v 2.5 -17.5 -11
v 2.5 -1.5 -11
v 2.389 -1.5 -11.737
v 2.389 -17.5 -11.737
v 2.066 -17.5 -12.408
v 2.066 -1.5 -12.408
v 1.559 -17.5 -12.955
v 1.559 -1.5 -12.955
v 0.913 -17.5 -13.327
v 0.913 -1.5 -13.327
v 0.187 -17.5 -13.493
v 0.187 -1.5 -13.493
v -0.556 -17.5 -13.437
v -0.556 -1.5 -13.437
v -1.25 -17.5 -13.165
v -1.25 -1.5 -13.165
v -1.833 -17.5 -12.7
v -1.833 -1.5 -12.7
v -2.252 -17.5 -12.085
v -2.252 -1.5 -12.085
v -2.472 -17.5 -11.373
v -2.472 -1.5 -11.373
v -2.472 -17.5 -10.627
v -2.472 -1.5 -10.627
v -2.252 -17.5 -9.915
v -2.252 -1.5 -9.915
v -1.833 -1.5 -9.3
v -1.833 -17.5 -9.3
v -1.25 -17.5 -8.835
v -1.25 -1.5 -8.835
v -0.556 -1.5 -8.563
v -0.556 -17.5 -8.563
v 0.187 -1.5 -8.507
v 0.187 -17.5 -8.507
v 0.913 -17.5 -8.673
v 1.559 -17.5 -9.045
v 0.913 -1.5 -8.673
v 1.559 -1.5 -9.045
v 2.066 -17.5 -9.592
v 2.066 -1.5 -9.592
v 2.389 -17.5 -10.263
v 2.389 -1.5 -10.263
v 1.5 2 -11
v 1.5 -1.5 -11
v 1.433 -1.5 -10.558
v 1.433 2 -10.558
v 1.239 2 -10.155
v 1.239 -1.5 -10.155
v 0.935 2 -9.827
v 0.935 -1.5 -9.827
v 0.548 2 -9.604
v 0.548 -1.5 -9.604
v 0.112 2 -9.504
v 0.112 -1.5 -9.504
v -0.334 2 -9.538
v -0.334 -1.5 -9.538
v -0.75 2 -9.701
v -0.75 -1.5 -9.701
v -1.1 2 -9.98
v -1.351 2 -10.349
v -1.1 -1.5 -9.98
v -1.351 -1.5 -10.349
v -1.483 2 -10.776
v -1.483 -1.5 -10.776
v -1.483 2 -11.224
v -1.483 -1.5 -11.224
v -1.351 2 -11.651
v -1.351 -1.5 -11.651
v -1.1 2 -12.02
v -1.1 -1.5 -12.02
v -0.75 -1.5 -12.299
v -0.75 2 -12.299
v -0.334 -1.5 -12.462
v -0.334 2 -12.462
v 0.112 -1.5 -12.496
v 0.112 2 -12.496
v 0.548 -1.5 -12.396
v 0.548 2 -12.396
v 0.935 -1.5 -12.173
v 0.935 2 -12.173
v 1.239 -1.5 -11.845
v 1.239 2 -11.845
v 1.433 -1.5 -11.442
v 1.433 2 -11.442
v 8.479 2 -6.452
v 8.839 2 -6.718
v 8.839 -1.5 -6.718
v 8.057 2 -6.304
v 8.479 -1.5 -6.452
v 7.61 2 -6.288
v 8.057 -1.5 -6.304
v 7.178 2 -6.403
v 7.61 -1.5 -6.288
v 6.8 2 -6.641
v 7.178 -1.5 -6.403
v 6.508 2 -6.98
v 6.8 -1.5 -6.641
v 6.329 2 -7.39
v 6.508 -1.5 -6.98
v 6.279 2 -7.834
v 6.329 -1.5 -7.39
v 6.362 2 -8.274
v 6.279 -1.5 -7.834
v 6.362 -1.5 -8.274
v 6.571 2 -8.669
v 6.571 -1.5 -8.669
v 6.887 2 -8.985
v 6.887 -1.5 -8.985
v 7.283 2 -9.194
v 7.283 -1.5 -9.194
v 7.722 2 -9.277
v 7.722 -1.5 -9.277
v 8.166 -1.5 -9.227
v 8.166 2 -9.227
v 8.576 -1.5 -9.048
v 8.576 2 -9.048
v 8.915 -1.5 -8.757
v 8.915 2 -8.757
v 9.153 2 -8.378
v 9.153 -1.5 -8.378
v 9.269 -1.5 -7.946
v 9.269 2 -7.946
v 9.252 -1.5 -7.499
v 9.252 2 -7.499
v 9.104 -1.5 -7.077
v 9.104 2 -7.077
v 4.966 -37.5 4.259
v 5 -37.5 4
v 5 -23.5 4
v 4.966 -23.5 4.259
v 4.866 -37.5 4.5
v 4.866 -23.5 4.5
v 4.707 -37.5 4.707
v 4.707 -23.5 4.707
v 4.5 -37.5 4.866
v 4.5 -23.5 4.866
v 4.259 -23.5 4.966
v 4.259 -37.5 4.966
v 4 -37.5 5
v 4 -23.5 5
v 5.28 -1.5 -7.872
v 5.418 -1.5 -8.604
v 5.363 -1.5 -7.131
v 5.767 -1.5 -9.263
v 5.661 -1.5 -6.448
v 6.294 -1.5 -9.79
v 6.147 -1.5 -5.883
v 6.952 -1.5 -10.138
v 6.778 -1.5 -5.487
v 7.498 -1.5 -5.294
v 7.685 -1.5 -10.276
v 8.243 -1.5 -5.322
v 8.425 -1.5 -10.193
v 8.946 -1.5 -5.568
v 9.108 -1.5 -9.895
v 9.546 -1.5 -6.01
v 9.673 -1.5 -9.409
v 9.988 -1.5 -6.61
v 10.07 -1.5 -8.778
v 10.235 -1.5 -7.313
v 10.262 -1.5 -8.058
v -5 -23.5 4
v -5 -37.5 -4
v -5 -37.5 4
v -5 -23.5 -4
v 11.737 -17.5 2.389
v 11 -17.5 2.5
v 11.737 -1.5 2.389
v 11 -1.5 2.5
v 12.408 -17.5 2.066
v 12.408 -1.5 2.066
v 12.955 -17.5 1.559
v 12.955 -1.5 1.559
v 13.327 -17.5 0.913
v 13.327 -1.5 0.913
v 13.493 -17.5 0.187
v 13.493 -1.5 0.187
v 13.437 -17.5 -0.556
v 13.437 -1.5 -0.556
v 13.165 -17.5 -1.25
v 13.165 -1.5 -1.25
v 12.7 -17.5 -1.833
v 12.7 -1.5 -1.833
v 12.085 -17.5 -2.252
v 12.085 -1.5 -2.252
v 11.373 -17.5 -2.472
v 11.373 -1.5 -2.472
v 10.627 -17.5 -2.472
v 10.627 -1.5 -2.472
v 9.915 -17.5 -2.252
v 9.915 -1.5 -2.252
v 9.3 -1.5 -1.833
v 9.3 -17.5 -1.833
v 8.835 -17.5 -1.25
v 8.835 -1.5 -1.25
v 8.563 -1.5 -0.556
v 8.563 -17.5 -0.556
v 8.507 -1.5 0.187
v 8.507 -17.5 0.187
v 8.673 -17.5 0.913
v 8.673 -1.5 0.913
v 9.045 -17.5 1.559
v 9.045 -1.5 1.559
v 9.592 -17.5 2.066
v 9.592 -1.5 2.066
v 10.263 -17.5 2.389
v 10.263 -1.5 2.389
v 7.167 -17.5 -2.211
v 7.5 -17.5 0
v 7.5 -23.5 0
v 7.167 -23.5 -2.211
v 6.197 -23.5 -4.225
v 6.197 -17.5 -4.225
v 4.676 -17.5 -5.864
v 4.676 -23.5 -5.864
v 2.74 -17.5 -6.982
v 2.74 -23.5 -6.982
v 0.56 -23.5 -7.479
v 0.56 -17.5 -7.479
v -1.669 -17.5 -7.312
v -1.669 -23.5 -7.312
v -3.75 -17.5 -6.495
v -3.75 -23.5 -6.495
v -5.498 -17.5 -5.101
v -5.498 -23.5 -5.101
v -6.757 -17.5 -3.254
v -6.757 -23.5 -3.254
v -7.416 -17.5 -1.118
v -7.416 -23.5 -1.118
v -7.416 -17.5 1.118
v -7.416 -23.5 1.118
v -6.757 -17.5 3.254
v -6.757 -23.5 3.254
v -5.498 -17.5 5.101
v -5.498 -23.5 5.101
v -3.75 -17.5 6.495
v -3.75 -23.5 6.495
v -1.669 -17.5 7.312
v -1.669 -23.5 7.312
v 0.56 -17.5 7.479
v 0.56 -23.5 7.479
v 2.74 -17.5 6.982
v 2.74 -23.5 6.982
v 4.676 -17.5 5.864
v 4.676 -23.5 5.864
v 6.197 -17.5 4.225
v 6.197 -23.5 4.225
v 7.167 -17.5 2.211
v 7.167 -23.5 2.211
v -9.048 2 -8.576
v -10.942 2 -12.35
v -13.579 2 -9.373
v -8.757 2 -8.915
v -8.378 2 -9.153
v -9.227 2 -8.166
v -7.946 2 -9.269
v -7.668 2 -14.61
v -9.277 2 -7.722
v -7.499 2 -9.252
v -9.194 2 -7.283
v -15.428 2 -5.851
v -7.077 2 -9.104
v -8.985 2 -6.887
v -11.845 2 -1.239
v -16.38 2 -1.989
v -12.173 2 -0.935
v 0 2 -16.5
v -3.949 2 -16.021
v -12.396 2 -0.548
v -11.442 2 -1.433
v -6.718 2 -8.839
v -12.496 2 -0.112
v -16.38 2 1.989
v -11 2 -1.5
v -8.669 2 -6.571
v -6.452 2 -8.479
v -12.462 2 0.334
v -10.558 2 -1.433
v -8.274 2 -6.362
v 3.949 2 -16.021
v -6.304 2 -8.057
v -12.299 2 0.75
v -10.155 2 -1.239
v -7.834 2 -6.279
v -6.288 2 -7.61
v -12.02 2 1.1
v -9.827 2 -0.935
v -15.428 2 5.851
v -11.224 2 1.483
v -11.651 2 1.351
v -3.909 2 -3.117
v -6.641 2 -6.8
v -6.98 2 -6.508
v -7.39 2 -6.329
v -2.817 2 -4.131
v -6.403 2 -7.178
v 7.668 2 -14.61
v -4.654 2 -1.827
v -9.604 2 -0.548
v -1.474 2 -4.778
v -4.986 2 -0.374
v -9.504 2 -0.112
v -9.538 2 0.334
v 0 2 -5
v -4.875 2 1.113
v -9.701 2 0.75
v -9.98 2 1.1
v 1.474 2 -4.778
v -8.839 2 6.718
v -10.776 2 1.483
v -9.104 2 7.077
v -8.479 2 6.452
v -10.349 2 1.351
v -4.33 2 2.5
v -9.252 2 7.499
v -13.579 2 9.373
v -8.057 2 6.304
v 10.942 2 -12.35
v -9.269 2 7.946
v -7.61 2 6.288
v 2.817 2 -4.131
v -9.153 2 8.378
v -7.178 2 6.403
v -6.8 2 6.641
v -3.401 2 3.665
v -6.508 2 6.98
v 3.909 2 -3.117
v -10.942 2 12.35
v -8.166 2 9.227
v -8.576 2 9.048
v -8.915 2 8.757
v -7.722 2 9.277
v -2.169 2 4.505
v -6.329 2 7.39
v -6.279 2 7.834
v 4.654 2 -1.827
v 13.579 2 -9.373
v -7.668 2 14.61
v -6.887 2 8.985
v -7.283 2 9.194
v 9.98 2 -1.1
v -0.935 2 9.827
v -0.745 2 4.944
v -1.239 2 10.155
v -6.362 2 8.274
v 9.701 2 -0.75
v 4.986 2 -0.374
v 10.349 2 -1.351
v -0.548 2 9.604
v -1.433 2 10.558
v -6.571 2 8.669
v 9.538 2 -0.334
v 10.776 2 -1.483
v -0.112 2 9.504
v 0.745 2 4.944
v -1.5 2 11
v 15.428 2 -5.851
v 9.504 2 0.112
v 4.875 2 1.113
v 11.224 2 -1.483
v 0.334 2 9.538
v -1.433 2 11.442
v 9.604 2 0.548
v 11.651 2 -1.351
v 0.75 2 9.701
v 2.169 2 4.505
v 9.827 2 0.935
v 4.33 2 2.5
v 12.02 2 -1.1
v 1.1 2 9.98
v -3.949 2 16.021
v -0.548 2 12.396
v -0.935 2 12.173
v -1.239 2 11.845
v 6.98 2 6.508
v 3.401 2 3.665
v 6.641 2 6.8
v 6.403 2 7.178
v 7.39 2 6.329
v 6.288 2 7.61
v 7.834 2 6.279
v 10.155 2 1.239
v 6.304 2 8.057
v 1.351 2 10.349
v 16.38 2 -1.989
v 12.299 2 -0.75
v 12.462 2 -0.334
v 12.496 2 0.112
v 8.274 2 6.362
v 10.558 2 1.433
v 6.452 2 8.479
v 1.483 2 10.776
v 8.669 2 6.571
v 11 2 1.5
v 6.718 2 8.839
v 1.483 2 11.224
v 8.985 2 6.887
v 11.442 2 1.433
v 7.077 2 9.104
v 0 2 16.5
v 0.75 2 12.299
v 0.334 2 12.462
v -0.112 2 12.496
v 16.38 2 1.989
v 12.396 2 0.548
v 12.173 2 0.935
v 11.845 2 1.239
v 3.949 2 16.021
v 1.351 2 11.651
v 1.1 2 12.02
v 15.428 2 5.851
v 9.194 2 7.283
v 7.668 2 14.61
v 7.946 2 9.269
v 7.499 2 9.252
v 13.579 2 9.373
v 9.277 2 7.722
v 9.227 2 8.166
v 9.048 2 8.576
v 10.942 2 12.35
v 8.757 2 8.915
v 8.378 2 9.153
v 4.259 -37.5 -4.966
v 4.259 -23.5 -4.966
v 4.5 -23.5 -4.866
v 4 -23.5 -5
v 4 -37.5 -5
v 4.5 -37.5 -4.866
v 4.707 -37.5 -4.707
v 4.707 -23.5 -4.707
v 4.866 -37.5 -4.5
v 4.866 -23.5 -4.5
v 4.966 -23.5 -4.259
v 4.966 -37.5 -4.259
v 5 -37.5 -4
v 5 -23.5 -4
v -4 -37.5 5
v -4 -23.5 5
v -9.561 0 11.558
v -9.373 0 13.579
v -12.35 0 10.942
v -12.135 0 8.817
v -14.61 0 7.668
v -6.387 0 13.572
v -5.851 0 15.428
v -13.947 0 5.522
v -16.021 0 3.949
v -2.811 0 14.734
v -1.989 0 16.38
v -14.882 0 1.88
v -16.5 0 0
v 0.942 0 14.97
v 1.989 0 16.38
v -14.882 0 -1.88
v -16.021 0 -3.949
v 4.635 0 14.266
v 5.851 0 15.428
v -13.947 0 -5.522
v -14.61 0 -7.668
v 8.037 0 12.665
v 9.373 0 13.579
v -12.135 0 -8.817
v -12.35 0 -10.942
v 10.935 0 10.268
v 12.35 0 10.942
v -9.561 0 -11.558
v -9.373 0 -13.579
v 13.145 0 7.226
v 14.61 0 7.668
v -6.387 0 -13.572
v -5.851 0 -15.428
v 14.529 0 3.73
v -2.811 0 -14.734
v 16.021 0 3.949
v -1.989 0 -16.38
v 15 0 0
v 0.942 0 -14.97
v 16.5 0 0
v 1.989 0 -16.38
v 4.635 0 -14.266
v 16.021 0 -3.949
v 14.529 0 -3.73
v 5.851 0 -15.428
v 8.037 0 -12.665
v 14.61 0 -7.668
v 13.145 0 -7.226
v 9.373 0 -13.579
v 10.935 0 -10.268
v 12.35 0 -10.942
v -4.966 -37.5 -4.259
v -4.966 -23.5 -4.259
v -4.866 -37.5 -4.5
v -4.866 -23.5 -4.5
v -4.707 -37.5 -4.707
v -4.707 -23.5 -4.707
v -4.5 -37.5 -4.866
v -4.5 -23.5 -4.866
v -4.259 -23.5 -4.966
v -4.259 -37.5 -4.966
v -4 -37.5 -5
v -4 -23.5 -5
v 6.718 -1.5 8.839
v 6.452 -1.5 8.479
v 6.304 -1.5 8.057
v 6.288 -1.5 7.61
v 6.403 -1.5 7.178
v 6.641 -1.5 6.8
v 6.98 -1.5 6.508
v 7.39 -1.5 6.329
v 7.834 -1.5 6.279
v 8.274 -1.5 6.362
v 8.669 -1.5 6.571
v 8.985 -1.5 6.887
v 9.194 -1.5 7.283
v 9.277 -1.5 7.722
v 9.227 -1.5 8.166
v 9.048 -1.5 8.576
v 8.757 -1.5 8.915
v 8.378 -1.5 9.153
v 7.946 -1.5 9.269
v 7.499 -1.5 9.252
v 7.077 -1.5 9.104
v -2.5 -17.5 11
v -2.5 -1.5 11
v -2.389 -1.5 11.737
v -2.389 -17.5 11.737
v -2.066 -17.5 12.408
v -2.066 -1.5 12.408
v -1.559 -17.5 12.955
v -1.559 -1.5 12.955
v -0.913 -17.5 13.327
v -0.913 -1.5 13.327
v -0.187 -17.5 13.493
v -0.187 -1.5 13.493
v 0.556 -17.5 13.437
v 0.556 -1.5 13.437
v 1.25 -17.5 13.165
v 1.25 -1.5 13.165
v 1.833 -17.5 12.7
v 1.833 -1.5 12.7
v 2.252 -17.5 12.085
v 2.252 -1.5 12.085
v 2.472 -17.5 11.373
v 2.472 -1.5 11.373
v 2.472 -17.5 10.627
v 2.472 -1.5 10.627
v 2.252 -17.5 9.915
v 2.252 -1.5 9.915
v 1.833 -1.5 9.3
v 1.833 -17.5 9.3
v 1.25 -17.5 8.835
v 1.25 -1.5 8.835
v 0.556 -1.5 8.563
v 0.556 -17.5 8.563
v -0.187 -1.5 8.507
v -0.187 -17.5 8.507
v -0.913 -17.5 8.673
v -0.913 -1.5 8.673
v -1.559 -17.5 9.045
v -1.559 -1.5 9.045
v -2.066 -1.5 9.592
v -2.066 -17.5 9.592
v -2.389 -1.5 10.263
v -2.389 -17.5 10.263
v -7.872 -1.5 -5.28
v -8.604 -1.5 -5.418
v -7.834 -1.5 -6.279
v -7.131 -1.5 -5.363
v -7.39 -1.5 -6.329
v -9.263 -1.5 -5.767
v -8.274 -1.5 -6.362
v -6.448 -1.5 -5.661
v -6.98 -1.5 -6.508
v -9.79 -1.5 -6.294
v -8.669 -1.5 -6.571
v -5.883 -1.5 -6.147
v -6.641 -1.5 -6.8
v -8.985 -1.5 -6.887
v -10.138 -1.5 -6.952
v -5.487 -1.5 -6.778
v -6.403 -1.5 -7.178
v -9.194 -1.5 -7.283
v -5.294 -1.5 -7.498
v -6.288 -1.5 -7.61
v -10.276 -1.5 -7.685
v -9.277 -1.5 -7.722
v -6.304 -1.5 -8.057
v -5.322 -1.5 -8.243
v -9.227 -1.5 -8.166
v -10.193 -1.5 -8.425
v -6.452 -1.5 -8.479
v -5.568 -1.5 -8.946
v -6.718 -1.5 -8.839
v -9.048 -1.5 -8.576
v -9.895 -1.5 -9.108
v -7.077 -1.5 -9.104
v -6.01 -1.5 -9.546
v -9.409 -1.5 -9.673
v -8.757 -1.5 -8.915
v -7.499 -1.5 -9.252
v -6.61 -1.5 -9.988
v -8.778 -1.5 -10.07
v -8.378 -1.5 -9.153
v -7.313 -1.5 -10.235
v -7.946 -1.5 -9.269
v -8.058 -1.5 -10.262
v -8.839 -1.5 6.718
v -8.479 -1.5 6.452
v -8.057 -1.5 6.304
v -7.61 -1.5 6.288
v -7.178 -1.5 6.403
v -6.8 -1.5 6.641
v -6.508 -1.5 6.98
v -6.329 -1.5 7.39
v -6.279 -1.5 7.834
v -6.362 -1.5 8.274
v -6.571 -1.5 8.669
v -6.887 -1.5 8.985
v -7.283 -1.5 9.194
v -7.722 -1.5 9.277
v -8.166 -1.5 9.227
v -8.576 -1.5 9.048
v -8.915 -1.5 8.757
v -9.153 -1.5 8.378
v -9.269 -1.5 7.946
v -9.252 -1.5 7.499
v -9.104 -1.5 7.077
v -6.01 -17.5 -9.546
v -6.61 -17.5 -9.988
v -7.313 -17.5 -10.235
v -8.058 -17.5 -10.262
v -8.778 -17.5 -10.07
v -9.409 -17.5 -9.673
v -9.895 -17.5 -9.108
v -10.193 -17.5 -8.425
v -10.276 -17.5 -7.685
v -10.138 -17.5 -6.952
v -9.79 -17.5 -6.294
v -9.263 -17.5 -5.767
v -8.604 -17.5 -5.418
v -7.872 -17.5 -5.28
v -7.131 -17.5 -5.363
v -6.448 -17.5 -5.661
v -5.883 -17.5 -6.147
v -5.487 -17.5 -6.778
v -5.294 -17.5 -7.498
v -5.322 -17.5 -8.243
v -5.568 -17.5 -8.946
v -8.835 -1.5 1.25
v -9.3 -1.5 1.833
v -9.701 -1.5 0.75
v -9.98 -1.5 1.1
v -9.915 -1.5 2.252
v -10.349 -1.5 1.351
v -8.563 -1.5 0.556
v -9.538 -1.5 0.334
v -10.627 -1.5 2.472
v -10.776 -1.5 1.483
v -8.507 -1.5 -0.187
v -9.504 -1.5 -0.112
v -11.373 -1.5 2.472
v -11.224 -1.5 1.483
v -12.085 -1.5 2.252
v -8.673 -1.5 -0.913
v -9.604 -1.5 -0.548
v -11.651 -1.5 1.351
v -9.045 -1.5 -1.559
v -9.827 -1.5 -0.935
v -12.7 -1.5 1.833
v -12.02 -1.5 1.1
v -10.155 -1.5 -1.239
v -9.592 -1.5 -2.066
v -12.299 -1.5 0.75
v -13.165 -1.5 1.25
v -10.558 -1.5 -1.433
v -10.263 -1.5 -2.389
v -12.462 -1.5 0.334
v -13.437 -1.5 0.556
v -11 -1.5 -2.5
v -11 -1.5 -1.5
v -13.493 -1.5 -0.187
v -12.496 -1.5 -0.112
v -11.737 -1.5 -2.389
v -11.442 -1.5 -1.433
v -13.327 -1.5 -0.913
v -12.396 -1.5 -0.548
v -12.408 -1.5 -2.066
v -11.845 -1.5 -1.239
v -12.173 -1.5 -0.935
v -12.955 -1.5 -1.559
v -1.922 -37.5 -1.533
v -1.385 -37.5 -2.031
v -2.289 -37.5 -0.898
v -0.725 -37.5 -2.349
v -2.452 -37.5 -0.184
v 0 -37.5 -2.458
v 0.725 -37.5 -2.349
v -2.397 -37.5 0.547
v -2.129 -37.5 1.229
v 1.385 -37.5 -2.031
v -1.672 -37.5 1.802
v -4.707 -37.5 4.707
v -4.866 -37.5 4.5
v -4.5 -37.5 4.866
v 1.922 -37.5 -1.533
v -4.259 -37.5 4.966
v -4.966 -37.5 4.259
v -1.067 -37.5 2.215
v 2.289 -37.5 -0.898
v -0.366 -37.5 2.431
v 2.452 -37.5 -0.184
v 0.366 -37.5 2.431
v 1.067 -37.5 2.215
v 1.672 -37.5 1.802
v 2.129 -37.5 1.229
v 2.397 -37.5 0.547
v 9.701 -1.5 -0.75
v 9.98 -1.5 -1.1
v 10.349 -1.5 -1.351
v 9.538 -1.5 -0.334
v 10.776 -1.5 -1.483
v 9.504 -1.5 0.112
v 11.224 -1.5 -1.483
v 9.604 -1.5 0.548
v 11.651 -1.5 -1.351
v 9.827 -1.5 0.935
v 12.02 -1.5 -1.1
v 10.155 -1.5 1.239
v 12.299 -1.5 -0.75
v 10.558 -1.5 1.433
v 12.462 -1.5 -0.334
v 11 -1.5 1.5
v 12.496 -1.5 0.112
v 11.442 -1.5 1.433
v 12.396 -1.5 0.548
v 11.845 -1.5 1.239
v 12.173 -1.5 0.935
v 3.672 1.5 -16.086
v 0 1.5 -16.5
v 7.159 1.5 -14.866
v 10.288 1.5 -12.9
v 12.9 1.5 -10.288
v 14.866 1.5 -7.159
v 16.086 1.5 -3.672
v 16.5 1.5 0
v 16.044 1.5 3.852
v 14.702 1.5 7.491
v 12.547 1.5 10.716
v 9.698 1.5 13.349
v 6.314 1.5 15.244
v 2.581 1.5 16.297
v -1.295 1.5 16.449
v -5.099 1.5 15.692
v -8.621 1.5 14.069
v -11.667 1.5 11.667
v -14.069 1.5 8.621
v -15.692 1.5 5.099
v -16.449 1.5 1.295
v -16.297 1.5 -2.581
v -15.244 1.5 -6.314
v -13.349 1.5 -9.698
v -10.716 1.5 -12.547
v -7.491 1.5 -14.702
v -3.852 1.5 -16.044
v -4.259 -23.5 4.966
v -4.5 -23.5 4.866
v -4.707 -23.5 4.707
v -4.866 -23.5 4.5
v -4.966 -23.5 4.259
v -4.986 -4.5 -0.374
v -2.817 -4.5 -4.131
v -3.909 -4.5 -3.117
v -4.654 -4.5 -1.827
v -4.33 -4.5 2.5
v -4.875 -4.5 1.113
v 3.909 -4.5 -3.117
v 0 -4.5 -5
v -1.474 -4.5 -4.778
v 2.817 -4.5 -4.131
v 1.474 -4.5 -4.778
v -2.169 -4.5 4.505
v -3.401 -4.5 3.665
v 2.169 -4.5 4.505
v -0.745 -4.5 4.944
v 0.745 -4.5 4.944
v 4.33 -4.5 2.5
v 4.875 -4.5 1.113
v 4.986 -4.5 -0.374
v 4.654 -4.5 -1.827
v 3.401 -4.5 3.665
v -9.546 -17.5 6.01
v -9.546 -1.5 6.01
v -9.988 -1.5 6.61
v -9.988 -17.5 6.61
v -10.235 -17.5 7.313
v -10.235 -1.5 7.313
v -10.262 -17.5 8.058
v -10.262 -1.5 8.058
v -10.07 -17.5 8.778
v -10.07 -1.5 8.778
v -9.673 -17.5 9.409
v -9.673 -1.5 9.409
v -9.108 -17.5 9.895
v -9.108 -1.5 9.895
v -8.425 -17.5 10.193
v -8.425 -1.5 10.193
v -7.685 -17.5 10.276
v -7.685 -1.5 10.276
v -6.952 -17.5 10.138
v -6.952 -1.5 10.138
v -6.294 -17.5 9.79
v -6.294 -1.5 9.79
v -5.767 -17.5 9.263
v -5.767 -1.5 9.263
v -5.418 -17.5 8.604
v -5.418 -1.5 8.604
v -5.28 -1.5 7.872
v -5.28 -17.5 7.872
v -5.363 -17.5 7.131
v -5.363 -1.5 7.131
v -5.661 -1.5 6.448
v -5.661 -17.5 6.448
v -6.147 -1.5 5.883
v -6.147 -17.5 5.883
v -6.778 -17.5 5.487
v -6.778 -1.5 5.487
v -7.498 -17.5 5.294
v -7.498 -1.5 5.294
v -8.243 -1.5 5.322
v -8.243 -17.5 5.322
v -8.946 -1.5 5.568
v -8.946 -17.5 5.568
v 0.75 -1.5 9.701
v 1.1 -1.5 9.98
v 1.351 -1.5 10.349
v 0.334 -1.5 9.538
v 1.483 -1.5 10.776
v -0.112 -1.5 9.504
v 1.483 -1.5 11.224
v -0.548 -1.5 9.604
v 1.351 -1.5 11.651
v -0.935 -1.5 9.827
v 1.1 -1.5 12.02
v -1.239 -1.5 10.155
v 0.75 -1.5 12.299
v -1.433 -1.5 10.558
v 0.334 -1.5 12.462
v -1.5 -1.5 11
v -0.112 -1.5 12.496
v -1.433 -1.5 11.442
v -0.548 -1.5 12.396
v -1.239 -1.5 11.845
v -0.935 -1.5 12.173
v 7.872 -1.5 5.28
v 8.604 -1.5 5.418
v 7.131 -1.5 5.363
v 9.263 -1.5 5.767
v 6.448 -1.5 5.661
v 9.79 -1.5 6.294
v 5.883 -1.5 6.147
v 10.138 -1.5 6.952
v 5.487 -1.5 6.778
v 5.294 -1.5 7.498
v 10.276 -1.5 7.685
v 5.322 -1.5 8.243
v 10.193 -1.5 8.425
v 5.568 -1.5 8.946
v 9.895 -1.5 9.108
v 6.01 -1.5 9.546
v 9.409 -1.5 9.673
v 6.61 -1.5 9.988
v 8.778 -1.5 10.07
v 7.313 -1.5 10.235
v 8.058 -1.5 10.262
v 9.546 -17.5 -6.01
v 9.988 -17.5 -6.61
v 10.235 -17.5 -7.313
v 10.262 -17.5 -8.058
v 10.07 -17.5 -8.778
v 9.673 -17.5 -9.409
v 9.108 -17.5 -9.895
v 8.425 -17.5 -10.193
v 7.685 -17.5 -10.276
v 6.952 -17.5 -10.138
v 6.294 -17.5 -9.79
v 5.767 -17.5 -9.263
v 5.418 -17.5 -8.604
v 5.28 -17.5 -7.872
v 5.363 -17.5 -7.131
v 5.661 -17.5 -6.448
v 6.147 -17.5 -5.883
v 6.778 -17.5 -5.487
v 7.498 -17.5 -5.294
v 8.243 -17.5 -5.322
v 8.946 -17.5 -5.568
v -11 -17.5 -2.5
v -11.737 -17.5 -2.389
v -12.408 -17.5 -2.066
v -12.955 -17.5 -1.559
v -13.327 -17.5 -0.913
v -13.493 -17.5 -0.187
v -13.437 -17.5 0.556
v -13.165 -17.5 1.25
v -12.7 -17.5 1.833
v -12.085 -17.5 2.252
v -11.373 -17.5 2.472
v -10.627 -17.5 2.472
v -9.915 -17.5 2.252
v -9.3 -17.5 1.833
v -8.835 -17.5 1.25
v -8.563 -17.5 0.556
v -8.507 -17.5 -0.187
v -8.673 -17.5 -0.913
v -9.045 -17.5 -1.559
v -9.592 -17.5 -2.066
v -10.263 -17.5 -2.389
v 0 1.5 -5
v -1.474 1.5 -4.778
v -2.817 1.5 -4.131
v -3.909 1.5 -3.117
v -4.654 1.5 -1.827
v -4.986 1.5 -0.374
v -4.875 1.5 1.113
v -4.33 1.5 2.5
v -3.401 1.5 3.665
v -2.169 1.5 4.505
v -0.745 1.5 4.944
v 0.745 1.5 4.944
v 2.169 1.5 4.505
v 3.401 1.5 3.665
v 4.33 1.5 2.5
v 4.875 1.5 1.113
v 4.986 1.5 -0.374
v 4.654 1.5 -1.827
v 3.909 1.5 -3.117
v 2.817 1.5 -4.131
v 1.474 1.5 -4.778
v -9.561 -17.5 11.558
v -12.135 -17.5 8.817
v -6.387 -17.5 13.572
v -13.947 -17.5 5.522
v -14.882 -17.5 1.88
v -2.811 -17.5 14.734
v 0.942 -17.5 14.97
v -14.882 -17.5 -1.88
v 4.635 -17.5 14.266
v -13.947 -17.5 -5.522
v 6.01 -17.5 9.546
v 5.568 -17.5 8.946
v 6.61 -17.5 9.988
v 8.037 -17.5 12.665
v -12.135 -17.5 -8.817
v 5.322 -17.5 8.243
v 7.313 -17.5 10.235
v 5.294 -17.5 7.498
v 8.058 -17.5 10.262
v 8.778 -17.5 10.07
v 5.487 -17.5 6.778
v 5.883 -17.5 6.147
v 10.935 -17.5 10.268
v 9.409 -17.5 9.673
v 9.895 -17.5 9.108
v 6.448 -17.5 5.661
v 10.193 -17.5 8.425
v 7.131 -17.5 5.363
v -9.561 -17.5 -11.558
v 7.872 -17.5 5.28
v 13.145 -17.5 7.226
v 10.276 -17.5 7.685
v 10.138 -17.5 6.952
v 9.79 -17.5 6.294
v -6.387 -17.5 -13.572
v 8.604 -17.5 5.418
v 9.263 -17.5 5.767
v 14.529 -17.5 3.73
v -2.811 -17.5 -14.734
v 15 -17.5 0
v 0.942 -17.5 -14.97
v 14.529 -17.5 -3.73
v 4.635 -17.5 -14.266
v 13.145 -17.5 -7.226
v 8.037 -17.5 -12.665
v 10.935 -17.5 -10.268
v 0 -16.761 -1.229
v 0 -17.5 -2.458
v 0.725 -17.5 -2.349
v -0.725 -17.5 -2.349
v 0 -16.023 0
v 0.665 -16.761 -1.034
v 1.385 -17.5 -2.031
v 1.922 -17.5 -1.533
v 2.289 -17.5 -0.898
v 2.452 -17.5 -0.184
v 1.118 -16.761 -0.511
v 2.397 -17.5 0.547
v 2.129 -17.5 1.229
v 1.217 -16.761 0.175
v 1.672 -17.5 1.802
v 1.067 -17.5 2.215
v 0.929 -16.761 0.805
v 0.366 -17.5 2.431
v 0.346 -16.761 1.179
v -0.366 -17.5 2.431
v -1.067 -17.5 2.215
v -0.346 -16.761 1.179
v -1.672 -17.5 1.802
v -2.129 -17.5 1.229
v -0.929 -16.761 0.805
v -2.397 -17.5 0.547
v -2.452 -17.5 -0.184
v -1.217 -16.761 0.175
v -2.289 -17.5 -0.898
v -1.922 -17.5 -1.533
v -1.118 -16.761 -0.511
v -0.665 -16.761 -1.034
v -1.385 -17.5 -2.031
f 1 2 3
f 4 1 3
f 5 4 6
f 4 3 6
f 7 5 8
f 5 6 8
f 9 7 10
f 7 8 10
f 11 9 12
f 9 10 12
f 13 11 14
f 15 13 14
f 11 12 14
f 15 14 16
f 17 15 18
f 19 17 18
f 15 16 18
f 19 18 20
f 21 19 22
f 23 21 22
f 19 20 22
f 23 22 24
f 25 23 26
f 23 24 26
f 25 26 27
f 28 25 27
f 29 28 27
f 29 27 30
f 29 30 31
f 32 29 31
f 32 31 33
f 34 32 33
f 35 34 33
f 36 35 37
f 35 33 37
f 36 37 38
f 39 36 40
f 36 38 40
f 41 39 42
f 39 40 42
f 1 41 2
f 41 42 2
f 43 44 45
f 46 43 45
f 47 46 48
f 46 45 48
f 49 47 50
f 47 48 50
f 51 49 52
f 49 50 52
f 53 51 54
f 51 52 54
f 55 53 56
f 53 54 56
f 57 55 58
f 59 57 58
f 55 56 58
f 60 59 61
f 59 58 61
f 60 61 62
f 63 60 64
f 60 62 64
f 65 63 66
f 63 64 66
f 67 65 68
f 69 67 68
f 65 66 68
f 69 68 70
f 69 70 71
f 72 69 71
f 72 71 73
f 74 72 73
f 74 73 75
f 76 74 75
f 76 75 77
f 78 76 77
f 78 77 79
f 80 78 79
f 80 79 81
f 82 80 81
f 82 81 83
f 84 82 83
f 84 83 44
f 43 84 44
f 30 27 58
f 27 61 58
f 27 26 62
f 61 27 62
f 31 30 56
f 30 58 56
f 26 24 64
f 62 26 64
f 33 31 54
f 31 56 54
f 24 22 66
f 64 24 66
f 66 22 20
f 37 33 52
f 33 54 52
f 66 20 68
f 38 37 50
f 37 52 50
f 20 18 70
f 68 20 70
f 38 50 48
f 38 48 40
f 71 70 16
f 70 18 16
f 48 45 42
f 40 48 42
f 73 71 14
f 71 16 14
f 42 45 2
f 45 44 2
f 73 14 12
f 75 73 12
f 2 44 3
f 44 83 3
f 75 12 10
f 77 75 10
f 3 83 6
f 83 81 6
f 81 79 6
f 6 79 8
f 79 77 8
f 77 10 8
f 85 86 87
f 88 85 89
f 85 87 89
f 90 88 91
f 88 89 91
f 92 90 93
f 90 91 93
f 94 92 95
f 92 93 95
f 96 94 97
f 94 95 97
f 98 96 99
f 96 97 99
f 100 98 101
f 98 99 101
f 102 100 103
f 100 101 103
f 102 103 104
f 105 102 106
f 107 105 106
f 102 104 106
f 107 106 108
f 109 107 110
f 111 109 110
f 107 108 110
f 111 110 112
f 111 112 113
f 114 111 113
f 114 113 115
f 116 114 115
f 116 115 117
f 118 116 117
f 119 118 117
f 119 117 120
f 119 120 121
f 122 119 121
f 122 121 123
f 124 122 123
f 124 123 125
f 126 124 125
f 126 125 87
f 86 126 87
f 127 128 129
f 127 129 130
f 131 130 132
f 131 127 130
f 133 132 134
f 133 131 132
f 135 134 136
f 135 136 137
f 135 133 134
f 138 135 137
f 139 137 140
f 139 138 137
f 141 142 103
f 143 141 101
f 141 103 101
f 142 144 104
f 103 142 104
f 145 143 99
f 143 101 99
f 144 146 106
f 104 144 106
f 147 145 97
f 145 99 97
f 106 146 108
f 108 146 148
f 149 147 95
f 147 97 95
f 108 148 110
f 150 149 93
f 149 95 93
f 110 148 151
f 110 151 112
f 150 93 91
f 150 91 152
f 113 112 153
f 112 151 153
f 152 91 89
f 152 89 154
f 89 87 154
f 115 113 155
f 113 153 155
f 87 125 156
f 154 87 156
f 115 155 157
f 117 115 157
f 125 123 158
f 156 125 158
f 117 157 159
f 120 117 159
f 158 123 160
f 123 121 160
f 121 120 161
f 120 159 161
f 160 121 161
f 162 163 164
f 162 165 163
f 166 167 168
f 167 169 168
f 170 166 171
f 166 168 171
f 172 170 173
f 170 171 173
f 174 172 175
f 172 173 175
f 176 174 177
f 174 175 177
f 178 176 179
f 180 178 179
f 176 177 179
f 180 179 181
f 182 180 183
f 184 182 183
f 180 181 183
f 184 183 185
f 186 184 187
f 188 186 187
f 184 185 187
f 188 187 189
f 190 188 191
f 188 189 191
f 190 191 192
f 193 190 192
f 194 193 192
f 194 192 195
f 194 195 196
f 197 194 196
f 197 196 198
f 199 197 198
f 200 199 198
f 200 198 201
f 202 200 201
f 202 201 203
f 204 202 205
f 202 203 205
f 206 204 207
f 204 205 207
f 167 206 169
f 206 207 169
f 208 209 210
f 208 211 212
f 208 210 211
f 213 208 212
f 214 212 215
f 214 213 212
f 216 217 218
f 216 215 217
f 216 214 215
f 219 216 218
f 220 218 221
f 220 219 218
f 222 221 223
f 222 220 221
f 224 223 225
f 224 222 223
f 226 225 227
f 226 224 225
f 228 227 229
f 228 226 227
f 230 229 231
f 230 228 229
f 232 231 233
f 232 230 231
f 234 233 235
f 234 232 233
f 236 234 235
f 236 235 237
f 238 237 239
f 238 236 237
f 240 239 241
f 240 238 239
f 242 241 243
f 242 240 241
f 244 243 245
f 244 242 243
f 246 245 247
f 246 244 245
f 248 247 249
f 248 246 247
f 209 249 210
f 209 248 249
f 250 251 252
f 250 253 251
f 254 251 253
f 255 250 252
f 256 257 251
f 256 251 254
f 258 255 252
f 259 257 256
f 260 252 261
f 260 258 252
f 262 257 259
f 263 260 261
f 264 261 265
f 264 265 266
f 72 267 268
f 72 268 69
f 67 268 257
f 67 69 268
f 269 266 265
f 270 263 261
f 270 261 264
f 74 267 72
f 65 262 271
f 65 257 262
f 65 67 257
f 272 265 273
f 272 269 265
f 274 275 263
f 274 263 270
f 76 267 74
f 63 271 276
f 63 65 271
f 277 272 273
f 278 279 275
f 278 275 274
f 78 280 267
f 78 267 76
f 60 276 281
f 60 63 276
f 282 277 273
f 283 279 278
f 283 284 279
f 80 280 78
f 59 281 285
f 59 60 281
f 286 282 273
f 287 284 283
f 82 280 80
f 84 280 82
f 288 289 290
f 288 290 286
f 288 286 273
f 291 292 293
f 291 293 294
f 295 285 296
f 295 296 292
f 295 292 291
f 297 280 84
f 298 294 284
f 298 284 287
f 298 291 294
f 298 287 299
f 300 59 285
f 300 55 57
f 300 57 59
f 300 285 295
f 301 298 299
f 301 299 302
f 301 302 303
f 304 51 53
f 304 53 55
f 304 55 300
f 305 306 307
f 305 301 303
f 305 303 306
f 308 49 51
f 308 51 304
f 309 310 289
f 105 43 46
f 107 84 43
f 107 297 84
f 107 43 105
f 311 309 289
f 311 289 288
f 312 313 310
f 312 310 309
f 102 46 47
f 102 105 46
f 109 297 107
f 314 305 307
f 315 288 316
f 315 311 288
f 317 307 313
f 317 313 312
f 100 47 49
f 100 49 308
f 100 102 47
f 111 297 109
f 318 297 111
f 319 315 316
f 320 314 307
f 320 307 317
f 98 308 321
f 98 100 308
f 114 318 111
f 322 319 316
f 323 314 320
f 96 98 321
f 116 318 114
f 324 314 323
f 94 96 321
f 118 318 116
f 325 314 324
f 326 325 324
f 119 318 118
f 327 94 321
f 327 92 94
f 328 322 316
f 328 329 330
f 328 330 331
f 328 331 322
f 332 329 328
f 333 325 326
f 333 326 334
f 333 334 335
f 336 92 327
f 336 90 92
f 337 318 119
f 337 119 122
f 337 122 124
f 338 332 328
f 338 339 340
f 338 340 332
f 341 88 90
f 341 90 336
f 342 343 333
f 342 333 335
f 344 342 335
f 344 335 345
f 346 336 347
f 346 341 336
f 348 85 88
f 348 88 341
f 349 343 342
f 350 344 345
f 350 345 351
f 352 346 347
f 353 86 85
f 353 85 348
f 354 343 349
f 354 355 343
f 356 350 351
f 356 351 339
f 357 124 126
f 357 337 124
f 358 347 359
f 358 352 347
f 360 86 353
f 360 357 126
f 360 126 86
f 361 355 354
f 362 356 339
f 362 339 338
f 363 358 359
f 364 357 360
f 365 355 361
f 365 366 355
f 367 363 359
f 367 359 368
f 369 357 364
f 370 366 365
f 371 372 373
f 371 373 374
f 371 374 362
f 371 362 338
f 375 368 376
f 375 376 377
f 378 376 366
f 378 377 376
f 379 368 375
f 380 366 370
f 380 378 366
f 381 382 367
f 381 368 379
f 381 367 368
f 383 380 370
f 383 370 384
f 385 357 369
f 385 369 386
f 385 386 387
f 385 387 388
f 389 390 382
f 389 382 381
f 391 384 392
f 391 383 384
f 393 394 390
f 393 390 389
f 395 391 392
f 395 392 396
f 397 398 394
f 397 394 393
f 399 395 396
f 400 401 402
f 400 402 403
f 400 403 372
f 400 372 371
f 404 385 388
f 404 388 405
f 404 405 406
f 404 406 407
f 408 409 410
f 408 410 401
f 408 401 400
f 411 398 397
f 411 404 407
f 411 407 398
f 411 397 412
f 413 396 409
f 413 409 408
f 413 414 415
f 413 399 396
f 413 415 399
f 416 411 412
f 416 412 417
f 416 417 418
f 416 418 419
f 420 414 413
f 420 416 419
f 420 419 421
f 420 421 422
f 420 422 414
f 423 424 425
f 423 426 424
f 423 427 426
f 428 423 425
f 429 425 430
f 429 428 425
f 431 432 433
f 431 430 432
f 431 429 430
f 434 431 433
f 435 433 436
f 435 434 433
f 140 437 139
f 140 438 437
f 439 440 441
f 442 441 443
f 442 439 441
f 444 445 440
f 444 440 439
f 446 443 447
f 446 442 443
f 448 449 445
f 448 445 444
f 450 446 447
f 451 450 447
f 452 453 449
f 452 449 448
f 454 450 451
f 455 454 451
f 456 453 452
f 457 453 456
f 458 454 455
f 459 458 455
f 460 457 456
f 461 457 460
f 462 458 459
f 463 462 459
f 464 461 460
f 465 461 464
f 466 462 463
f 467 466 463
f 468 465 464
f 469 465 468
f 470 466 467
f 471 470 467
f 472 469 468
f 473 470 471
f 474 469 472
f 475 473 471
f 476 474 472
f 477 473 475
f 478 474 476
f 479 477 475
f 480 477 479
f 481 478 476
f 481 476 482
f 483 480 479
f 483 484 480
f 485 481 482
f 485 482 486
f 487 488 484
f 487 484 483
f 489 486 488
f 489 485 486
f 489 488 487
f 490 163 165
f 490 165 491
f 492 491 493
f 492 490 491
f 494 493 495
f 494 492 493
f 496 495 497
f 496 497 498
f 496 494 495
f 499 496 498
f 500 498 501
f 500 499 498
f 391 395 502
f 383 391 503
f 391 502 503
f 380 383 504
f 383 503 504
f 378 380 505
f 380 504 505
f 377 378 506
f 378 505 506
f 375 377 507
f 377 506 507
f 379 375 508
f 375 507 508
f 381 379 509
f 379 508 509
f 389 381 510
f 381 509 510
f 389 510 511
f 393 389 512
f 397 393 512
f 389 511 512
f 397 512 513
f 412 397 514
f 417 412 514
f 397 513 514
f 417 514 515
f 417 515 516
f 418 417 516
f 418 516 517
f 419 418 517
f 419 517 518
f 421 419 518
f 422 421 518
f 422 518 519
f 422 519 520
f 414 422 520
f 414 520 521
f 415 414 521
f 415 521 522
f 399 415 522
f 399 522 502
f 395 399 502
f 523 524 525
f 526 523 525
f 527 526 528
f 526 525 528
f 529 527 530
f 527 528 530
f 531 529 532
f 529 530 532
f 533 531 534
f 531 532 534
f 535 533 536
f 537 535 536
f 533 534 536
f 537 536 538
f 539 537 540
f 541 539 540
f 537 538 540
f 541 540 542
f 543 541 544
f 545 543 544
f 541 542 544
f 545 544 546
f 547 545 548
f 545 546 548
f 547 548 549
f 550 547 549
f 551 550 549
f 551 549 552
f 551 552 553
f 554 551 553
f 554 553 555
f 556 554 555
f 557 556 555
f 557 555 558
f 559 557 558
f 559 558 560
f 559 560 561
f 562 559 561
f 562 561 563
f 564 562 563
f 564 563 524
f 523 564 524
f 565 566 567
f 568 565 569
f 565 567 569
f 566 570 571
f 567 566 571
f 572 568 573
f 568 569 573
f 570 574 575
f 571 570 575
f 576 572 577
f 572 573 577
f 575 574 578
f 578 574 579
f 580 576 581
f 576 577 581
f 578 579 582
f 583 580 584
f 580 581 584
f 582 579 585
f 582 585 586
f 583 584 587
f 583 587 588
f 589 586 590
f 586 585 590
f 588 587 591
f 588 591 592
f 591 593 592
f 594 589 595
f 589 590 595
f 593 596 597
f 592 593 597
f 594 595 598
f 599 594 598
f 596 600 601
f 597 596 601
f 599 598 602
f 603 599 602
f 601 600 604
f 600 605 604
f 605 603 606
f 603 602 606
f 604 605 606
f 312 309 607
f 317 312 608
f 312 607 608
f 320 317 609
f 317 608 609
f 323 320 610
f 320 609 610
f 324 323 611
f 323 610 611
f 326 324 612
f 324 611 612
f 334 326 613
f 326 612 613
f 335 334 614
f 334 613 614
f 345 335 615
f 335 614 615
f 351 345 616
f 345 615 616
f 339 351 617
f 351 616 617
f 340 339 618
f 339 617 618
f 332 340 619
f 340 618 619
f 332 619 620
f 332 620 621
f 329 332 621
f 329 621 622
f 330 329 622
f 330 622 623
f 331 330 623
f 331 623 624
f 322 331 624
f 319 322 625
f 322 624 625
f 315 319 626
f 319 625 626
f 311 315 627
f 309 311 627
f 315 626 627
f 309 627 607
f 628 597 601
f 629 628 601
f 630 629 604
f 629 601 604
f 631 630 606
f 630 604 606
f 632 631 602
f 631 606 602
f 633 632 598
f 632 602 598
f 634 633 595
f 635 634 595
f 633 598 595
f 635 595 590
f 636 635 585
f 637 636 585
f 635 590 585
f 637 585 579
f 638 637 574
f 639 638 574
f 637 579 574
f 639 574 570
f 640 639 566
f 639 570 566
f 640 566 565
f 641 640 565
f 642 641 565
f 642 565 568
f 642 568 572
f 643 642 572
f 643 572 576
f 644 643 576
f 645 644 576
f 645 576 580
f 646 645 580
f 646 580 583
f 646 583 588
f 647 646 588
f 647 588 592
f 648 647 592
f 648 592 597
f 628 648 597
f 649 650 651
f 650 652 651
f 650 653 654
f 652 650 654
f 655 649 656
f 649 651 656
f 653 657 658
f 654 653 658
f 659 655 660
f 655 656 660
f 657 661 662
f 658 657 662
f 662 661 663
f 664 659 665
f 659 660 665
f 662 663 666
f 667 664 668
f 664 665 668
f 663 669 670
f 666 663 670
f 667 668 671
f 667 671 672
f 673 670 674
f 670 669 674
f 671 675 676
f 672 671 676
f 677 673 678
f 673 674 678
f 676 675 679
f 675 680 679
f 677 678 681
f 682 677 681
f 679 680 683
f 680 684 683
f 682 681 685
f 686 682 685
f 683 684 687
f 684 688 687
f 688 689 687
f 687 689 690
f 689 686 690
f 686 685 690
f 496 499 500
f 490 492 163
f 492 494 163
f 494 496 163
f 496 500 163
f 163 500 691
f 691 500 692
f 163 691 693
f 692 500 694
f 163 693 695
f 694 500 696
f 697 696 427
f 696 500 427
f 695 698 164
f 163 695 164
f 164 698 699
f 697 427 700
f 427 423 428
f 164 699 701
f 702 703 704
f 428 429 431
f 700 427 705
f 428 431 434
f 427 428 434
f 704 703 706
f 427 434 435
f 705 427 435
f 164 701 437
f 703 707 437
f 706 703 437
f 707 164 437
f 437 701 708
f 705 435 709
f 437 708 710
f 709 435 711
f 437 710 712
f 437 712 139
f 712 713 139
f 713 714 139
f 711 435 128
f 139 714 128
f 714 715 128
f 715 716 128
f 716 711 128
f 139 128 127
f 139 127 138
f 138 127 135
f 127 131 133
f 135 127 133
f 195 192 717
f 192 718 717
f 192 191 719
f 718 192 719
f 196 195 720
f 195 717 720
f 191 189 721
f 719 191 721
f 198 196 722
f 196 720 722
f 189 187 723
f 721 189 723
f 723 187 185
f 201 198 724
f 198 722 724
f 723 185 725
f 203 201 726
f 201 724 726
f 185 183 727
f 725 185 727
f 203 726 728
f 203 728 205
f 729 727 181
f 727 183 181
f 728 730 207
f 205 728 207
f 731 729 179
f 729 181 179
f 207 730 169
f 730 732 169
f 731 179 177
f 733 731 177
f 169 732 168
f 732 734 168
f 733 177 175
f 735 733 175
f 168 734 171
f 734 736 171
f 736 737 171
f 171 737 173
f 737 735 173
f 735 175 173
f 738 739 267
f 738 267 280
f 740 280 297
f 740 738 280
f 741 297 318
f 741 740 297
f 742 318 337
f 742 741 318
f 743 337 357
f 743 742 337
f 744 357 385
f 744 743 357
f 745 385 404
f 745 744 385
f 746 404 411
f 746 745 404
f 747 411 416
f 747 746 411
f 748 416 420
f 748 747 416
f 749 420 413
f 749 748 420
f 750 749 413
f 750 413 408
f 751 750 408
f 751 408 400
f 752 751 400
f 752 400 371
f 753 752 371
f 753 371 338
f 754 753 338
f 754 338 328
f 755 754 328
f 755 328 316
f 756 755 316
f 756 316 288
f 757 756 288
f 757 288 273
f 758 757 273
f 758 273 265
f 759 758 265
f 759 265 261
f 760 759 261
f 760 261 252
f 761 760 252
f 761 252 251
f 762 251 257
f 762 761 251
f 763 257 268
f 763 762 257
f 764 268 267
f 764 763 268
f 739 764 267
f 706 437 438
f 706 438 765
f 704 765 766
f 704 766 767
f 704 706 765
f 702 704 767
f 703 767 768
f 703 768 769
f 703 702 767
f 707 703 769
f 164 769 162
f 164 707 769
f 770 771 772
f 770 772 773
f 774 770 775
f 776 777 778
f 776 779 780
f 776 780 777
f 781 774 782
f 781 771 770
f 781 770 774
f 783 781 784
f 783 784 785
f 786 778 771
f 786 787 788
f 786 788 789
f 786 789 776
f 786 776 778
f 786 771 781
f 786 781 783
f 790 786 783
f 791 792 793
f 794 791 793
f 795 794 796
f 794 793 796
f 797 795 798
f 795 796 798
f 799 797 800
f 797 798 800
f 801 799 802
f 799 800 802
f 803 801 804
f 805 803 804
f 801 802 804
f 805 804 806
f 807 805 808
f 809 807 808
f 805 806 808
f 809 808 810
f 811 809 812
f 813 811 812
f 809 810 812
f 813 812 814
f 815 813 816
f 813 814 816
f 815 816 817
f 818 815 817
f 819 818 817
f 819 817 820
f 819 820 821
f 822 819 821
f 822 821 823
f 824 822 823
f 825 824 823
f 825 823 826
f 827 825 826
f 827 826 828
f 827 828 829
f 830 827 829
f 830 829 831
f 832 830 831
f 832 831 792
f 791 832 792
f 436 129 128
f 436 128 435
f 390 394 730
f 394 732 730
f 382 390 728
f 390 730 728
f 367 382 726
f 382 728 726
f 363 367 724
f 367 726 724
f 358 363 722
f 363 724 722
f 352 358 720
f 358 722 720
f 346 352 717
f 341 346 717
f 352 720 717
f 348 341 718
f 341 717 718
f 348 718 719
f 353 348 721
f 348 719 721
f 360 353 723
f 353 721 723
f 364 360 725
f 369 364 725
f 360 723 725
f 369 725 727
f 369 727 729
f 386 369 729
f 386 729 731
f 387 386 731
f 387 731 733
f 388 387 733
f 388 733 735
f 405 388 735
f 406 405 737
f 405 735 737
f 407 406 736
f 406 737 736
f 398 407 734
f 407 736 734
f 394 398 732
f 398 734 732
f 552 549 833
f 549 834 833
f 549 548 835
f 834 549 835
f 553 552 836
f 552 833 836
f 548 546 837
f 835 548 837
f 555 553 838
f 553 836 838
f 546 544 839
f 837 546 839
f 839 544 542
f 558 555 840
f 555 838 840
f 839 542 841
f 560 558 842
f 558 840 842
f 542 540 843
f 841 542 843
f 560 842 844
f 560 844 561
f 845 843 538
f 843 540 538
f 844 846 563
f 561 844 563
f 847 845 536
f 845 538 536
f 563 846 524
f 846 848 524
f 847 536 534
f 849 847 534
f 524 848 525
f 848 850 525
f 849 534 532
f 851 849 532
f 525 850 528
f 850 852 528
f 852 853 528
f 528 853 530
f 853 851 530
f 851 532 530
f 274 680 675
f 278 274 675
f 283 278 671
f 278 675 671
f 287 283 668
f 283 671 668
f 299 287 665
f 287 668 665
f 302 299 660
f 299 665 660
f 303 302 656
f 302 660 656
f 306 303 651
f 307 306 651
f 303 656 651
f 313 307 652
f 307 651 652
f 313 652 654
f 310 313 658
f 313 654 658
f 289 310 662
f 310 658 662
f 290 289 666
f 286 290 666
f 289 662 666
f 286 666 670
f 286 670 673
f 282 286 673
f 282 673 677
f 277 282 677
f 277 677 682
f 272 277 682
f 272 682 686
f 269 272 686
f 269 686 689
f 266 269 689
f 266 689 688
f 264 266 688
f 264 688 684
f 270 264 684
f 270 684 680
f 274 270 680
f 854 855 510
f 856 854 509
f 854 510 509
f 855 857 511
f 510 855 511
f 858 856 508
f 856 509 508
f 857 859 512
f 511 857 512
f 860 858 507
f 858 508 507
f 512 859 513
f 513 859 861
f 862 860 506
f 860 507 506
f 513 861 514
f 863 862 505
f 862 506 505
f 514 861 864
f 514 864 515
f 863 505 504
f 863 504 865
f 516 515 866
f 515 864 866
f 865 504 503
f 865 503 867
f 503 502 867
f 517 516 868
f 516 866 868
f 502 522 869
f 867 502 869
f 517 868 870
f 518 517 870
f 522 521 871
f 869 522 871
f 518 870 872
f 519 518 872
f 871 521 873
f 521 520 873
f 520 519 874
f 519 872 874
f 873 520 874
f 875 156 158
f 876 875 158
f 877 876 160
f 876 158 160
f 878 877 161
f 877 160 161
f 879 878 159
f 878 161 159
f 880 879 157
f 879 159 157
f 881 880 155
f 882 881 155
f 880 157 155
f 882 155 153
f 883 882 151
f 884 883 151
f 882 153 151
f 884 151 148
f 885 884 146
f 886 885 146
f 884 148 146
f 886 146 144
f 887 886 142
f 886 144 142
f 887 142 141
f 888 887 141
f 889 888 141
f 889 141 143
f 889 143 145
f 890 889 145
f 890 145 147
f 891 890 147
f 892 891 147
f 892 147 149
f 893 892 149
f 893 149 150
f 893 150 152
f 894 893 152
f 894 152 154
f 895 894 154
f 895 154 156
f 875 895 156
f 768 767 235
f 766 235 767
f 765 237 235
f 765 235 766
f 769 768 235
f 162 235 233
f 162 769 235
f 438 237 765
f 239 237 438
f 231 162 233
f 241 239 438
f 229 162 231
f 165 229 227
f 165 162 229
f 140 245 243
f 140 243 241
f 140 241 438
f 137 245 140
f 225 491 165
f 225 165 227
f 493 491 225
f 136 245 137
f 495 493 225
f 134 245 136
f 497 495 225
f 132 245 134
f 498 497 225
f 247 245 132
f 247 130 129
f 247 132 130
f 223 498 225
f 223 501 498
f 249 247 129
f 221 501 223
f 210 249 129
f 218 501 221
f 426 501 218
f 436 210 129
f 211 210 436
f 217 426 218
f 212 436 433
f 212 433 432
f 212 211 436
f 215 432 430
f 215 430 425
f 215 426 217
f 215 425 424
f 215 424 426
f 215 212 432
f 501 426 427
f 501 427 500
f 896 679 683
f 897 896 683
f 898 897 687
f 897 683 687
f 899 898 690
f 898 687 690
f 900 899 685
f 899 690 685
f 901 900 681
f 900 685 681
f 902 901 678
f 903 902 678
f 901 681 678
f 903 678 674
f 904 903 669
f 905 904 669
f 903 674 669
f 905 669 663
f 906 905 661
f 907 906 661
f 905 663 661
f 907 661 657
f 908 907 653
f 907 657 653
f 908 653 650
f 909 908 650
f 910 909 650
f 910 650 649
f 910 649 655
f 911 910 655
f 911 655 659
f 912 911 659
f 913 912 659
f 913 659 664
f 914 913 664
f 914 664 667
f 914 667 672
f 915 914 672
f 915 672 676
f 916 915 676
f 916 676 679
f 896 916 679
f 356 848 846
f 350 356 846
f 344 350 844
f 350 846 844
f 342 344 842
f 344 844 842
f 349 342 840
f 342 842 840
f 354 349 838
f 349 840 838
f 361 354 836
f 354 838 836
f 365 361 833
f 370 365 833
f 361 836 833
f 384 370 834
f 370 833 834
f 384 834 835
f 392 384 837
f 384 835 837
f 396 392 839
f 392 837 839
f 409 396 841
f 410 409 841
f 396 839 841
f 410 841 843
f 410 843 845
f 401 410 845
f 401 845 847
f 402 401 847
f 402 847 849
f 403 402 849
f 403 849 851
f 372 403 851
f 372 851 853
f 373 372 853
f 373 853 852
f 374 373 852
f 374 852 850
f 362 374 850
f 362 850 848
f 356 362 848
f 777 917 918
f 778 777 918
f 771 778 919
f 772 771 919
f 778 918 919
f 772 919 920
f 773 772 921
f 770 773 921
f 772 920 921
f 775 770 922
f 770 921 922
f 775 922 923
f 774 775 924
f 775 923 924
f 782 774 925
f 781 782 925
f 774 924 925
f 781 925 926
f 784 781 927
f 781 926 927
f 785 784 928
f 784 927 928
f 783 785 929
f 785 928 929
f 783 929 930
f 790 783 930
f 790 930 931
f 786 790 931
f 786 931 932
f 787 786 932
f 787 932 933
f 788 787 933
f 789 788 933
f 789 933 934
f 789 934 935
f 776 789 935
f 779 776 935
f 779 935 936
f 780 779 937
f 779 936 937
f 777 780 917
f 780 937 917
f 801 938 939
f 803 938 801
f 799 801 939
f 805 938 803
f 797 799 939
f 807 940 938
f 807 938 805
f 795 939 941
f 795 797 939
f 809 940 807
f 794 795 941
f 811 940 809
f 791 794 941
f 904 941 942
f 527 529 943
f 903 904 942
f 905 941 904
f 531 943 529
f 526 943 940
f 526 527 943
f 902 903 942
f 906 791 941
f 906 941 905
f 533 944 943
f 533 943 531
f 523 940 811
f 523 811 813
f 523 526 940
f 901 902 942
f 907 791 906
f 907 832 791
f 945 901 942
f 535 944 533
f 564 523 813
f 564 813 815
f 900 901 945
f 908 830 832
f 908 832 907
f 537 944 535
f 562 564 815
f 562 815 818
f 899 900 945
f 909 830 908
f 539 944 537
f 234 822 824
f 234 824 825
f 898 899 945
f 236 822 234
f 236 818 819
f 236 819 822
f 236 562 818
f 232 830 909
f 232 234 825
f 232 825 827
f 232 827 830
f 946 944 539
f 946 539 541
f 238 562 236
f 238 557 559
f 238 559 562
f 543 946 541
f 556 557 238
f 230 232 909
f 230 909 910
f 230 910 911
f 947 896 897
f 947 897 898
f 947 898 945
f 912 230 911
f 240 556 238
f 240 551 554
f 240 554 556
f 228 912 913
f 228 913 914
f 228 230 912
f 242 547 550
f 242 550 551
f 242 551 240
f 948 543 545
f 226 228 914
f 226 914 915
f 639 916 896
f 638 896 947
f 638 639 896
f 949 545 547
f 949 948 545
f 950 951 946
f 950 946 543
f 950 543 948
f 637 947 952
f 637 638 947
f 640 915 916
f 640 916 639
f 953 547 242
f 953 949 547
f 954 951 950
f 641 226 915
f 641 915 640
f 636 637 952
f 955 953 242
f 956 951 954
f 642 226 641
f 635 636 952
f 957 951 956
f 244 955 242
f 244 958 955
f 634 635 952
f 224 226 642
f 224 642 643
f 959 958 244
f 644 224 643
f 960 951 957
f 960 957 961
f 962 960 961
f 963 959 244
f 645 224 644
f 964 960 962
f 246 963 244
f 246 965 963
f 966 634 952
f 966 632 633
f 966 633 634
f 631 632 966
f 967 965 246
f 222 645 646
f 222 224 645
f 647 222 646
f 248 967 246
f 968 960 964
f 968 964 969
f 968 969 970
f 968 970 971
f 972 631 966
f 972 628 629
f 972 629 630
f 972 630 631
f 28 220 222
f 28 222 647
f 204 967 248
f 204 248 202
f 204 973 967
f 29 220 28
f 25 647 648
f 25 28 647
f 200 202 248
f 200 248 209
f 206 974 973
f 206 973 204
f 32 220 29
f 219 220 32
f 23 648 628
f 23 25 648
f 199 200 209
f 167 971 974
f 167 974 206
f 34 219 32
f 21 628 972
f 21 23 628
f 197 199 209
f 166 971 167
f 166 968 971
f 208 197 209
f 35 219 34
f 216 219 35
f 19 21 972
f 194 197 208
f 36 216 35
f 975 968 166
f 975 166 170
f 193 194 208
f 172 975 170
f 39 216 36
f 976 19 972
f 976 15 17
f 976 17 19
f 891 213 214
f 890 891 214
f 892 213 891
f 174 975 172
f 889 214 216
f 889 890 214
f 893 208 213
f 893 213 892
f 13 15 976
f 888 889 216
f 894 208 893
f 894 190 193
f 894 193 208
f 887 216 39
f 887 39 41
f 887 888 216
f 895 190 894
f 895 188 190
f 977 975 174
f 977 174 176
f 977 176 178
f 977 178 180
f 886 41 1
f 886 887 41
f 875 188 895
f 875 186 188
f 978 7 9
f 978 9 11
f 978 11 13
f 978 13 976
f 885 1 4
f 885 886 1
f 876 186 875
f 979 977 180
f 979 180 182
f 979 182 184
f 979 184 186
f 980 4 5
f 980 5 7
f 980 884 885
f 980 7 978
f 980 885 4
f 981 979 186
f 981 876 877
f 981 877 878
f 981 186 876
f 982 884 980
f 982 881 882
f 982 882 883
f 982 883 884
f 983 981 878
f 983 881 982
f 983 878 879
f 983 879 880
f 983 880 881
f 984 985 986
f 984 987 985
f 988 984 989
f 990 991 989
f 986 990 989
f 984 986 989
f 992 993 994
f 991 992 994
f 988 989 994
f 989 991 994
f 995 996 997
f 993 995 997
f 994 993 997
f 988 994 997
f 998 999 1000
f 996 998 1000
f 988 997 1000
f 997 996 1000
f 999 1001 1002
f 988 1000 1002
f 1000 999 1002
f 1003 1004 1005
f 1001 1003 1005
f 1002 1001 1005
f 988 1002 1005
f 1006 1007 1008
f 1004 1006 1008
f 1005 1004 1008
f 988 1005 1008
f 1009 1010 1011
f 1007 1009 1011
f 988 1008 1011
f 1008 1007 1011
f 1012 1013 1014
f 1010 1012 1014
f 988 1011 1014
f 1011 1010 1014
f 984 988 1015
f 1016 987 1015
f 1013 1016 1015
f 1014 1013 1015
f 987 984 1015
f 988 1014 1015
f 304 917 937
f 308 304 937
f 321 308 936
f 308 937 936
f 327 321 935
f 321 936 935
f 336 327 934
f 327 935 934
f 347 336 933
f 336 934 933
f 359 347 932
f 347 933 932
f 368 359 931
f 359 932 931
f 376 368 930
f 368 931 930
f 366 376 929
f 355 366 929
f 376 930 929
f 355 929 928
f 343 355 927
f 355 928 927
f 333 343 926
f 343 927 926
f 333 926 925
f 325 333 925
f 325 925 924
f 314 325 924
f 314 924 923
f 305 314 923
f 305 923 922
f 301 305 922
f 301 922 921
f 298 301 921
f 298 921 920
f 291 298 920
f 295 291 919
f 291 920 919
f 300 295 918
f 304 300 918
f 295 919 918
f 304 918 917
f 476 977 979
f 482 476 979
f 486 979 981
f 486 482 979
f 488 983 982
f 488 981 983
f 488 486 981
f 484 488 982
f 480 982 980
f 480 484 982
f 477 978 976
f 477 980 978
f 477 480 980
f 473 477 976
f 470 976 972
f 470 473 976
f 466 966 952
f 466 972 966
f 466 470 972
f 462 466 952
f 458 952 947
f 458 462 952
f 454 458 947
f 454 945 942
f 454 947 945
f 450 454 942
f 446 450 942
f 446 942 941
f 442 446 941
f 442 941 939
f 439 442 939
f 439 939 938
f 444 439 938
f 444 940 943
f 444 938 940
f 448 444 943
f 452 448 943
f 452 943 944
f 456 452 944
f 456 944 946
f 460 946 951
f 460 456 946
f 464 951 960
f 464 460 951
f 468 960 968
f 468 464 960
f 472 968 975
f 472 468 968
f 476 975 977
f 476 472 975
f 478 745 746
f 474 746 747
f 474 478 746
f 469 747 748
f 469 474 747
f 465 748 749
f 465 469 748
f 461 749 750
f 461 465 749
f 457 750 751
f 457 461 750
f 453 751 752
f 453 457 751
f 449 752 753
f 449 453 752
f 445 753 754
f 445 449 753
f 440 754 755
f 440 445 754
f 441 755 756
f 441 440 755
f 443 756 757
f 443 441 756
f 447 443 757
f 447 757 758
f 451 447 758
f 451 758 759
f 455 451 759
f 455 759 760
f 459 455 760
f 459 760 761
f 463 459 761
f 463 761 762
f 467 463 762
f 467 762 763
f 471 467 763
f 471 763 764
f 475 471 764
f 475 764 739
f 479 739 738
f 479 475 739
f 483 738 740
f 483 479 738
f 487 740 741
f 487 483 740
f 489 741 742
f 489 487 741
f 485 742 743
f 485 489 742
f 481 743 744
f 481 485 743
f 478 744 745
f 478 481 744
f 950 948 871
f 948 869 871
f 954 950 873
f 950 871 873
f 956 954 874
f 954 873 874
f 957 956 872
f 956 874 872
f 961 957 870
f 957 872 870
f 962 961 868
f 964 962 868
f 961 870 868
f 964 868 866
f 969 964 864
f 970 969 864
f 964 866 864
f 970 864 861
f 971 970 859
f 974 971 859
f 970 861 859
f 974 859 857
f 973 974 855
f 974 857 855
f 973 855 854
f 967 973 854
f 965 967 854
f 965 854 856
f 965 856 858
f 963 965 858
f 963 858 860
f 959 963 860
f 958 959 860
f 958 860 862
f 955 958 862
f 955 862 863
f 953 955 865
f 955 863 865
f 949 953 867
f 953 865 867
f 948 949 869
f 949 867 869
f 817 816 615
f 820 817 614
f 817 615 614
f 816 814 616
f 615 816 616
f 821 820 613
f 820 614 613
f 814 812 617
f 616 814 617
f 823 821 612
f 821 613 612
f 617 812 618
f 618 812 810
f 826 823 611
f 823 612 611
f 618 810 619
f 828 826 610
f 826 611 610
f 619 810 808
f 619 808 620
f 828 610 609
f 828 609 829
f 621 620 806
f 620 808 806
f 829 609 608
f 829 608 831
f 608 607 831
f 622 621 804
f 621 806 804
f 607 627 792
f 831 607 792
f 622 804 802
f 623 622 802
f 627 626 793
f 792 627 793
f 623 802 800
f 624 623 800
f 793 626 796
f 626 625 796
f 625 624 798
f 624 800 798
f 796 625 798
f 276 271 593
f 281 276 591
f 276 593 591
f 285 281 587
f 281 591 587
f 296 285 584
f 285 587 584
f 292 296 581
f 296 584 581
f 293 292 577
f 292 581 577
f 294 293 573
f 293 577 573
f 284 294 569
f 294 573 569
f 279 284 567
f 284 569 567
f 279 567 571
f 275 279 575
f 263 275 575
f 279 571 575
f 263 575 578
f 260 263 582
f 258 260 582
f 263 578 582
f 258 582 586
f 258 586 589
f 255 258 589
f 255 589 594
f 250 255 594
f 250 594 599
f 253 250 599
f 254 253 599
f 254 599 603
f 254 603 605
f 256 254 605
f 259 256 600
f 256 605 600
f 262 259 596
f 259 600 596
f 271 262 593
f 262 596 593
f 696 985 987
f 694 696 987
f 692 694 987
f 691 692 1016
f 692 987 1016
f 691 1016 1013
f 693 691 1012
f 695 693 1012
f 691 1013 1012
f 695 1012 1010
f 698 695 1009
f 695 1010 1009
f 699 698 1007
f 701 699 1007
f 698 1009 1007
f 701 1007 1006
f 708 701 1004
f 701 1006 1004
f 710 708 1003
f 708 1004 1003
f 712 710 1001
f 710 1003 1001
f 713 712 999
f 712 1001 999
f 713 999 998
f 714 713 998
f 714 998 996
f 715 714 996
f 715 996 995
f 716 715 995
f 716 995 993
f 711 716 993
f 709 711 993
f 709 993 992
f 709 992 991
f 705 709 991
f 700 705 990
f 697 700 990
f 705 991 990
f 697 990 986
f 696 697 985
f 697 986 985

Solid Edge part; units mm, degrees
sketch "Sketch1" plane through (0, 0, 0) normal (0, -1, 0) x (1, 0, 0)
  circle A0 centre (0, 0) radius 16.5
extrude "Protrusion1" add sketch "Sketch1" against normal blind 1.5
sketch "Sketch2" plane through (0, 0, 0) normal (0, -1, 0) x (1, 0, 0)
  circle A0 centre (0, 0) radius 15
  dimension "D1" = 30
extrude "ProtrusiónExtruida_2" add sketch "Sketch2" along normal blind 17.5
sketch "Sketch3" plane through (0, -17.5, 0) normal (0, -1, 0) x (1, 0, 0)
  circle A0 centre (0, 0) radius 7.5
  dimension "D1" = 15
extrude "ProtrusiónExtruida_3" add sketch "Sketch3" along normal blind 6
sketch "Sketch4" plane through (0, -23.5, 0) normal (0, -1, 0) x (1, 0, 0)
  line L0 (5, -5) -> (-5, -5)
  line L1 (-5, -5) -> (-5, 5)
  line L2 (-5, 5) -> (5, 5)
  line L3 (5, 5) -> (5, -5)
  dimension "D1" = 10
  dimension "D2" = 10
extrude "ProtrusiónExtruida_4" add sketch "Sketch4" along normal blind 14
sketch "Sketch5" plane through (0, 1.5, 0) normal (0, 1, 0) x (0, 0, -1)
  circle A0 centre (0, 0) radius 16.5
extrude "ProtrusiónExtruida_5" add sketch "Sketch5" along normal blind 0.54
hole "Agujero_1" at (-11, -17.5, 0) direction (0, 1, 0) diameter 3 end up to next counterbore diameter 5 counterbore depth 16
pattern_circular "Pattern1" count 8 over 360 about axis through (0, -17.5, 0) along (0, 1, 0) of "Agujero_1"
sketch "Sketch6" plane through (0, 1.5, 0) normal (0, 1, 0) x (0, 0, -1)
  circle A0 centre (0, 0) radius 5
  dimension "D1" = 10
extrude "VaciadoExtruido_1" cut sketch "Sketch6" along normal mid plane 12
fillet "Redondeo_1" radius 1 4 edges at (-5, -30.5, -5) (-5, -30.5, 5) (5, -30.5, 5) (5, -30.5, -5)
hole "Agujero_9" at (0, -37.5, 0) direction (0, 1, 0) diameter 4.917 depth 20 tip angle 118 thread major 6 thread length 18
sketch "Sketch7" plane through (0, 2.04, 0) normal (0, 1, 0) x (0, 0, 1)
  circle A0 centre (0, 0) radius 16.5
extrude "VaciadoExtruido_2" cut sketch "Sketch7" against normal blind 0.04
properties part number "1976-1200-012" material "Aluminio, 7075-T6"
